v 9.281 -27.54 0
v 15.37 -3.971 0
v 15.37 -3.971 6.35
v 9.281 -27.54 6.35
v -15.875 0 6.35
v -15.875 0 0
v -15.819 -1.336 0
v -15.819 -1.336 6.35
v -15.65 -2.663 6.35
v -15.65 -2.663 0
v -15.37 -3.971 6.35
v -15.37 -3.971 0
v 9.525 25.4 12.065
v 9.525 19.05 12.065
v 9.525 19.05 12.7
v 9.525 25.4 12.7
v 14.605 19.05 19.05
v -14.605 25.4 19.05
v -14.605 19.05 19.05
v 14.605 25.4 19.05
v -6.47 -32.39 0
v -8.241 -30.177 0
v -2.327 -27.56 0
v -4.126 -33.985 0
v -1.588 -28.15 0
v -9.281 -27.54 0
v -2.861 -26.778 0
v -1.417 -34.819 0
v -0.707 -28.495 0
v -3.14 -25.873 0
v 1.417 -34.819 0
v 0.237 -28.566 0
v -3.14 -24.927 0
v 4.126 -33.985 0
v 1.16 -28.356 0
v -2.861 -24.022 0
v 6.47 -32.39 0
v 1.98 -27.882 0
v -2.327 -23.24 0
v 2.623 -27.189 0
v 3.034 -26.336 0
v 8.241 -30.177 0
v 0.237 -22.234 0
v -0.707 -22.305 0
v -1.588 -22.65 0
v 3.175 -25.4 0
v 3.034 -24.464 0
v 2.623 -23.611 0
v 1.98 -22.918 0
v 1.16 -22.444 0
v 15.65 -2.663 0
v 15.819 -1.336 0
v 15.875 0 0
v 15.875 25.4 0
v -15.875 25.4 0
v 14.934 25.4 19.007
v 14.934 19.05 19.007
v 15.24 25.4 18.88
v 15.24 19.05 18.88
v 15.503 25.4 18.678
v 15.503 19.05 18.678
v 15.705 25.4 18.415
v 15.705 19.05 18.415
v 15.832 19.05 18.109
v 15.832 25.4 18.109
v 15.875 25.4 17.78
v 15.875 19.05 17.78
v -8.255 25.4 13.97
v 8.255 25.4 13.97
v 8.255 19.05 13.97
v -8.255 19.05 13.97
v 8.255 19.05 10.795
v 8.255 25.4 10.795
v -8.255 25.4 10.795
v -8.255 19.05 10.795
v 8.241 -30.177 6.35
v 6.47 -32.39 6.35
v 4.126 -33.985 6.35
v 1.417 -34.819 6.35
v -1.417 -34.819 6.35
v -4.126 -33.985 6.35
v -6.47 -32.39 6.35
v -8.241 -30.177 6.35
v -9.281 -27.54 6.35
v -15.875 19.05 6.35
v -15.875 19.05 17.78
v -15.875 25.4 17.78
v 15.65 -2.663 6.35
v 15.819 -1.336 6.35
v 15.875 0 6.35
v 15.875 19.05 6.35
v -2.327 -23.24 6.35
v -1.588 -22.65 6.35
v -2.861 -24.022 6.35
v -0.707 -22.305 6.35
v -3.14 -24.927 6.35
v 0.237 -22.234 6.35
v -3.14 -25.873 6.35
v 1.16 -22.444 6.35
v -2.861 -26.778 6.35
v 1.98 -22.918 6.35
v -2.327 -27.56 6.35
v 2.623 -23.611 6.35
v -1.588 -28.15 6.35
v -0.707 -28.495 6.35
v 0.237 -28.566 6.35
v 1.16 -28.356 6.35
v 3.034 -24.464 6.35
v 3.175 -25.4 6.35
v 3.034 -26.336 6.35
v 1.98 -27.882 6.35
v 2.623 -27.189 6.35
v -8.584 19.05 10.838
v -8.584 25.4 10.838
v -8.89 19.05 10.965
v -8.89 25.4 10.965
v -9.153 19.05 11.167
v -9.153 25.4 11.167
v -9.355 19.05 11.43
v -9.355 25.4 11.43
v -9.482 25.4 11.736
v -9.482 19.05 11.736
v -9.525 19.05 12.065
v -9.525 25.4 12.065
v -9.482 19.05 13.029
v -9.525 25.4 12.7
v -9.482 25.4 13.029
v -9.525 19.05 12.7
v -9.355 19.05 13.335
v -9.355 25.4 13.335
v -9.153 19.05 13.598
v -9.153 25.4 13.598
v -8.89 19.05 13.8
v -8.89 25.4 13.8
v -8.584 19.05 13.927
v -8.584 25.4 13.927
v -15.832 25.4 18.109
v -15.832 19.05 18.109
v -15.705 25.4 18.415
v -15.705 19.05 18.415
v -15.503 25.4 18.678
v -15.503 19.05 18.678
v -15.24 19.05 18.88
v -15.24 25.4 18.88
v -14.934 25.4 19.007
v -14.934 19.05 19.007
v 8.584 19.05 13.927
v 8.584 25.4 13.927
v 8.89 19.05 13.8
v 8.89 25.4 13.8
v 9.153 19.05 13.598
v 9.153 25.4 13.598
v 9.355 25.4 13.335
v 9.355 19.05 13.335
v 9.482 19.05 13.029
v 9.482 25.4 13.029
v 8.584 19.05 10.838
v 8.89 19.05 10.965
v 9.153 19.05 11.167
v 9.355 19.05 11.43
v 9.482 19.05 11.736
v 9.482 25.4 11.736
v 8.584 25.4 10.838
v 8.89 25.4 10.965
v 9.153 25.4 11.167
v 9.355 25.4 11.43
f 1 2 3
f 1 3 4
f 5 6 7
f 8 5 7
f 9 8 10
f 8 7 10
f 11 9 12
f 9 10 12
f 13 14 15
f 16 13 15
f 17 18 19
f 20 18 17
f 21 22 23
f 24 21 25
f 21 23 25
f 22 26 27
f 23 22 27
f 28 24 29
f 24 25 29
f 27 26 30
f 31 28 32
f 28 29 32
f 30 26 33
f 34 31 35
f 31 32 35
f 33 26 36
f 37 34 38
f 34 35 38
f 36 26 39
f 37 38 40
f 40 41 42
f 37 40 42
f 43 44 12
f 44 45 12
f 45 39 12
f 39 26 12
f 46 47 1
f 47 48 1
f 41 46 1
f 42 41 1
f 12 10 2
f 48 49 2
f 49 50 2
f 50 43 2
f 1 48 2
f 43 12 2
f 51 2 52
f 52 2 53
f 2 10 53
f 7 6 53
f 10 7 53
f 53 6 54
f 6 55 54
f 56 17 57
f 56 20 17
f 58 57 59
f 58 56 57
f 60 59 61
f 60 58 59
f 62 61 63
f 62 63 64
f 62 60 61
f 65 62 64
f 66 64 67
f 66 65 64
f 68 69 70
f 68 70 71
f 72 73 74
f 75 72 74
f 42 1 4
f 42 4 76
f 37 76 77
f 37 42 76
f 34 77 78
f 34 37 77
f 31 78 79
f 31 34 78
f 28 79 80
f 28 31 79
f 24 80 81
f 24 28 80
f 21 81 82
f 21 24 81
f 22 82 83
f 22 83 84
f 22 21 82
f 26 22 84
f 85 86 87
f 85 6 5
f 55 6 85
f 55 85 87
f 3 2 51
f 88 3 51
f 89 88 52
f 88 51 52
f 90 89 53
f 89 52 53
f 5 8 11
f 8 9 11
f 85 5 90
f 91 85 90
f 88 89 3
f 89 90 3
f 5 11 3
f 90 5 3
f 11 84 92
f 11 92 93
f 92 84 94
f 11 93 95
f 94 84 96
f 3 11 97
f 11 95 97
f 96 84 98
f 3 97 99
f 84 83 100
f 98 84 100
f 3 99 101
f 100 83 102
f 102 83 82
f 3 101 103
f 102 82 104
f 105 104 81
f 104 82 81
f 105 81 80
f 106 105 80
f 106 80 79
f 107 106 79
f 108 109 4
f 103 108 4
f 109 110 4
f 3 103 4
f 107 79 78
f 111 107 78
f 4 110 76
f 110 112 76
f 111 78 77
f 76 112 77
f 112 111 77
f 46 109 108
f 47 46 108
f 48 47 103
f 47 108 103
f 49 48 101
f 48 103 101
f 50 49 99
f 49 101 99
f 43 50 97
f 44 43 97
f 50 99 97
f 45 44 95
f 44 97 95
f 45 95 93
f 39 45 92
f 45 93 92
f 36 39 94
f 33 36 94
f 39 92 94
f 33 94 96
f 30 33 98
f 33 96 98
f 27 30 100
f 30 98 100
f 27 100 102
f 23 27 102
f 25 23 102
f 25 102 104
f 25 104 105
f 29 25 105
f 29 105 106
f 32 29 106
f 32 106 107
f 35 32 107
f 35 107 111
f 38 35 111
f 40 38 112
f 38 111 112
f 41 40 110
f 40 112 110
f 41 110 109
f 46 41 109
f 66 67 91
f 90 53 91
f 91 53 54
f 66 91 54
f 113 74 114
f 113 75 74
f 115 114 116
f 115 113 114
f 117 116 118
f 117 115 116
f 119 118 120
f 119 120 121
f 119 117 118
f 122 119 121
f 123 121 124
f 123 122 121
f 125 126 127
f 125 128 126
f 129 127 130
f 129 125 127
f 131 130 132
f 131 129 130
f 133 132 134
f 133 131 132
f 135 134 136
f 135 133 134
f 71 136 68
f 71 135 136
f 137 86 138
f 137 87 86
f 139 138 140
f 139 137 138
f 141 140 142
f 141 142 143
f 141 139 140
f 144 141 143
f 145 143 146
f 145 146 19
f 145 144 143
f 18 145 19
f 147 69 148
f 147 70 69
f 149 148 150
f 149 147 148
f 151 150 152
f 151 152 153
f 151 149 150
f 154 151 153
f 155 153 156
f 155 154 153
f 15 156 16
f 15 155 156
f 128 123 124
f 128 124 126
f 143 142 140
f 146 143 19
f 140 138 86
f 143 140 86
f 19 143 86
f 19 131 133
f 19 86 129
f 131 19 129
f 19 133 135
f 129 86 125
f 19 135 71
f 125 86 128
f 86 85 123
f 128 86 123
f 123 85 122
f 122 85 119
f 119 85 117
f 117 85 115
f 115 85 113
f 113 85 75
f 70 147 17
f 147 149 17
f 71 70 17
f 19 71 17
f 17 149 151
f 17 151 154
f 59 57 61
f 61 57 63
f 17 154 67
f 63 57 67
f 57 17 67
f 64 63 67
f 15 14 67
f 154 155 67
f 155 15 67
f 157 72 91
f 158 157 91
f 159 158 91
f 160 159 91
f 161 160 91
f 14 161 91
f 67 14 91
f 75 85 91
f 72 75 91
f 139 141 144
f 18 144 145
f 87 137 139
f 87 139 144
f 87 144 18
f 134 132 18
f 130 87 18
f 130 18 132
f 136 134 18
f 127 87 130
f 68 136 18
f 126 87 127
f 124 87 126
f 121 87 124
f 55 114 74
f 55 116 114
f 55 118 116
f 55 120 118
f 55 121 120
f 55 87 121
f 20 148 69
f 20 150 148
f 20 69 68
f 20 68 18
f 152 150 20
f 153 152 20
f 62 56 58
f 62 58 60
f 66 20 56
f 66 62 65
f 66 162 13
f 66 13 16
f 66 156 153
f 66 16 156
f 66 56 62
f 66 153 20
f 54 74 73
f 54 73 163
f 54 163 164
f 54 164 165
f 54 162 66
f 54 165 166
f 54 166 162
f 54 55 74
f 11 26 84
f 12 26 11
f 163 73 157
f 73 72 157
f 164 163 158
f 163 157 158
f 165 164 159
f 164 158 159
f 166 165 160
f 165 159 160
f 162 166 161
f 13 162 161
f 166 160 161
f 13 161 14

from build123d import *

# Parameters (mm, degrees)
F0_R      = 15.875
F0_R_2    = 12.7
F1_DEPTH  = 6.35
F2_W      = 31.75
F2_H      = 25.4
F3_DEPTH  = 6.35
F4_W      = 31.75
F4_H      = 6.35
F5_DEPTH  = 12.7
F6_W      = 19.05
F6_H      = 3.175
F7_DEPTH  = 6.35
F8_R      = 1.27
F9_R      = 12.7
F10_DEPTH = 6.35
F12_DEPTH = 6.35
F13_R     = 3.175
F14_DEPTH = 6.35


with BuildPart() as f1:
    # F0 (on Top) → F1 (new body)
    with BuildSketch(Plane.XY):
        Circle(F0_R)
        Circle(F0_R_2, mode=Mode.SUBTRACT)
    extrude(amount=F1_DEPTH)

    # F2 (on Top) → F3 (join)
    with BuildSketch(Plane.XY):
        with Locations((0, 12.7)):
            Rectangle(F2_W, F2_H)
    extrude(amount=F3_DEPTH)

    # F4 (on face) → F5 (join)
    with BuildSketch(Plane.XY.offset(6.35)):
        with Locations((0, 22.225)):
            Rectangle(F4_W, F4_H)
    extrude(amount=F5_DEPTH)

    # F6 (on face) → F7 (cut, through all)
    with BuildSketch(Plane(origin=(0, 25.4, 0), x_dir=(-1, 0, 0), z_dir=(0, 1, 0))):
        with Locations((0, 12.3825)):
            Rectangle(F6_W, F6_H)
    extrude(amount=-F7_DEPTH, mode=Mode.SUBTRACT)

    # F8
    f8_edges = [f1.edges().sort_by_distance(p)[0] for p in [
        (-9.525, 22.225, 13.97),
        (9.525, 22.225, 13.97),
        (9.525, 22.225, 10.795),
        (-9.525, 22.225, 10.795),
        (15.875, 22.225, 19.05),
        (-15.875, 22.225, 19.05),
    ]]
    fillet(f8_edges, radius=F8_R)

    # F9 (on face) → F10 (join)
    with BuildSketch(Plane(origin=(0, 0, 0), x_dir=(1, 0, 0), z_dir=(0, 0, -1))):
        Circle(F9_R)
    extrude(amount=-F10_DEPTH)

    # F11 (on face) → F12 (join)
    with BuildSketch(Plane(origin=(0, 0, 0), x_dir=(1, 0, 0), z_dir=(0, 0, -1))):
        with BuildLine():
            ThreePointArc((-15.370375, 3.970791), (-9.720579, 12.550935), (0, 15.875))
            ThreePointArc((0, 15.875), (-7.45355, 19.469551), (-9.281448, 27.540177))
            Line((-9.281448, 27.540177), (-15.370375, 3.970791))
        make_face()
        with BuildLine():
            ThreePointArc((0, 15.875), (6.735192, 18.664808), (9.525, 25.4))
            ThreePointArc((9.525, 25.4), (9.463916, 26.476995), (9.281448, 27.540177))
            ThreePointArc((9.281448, 27.540177), (0, 34.925), (-9.281448, 27.540177))
            ThreePointArc((-9.281448, 27.540177), (-7.45355, 19.469551), (0, 15.875))
        make_face()
        with BuildLine():
            ThreePointArc((9.281448, 27.540177), (9.463916, 26.476995), (9.525, 25.4))
            ThreePointArc((9.525, 25.4), (6.735192, 18.664808), (0, 15.875))
            ThreePointArc((0, 15.875), (9.720579, 12.550935), (15.370375, 3.970791))
            Line((15.370375, 3.970791), (9.281448, 27.540177))
        make_face()
    extrude(amount=-F12_DEPTH)

    # F13 (on face) → F14 (cut, through all)
    with BuildSketch(Plane.XY.offset(6.35)):
        with Locations((0, -25.4)):
            Circle(F13_R)
    extrude(amount=-F14_DEPTH, mode=Mode.SUBTRACT)


solid = f1.part
